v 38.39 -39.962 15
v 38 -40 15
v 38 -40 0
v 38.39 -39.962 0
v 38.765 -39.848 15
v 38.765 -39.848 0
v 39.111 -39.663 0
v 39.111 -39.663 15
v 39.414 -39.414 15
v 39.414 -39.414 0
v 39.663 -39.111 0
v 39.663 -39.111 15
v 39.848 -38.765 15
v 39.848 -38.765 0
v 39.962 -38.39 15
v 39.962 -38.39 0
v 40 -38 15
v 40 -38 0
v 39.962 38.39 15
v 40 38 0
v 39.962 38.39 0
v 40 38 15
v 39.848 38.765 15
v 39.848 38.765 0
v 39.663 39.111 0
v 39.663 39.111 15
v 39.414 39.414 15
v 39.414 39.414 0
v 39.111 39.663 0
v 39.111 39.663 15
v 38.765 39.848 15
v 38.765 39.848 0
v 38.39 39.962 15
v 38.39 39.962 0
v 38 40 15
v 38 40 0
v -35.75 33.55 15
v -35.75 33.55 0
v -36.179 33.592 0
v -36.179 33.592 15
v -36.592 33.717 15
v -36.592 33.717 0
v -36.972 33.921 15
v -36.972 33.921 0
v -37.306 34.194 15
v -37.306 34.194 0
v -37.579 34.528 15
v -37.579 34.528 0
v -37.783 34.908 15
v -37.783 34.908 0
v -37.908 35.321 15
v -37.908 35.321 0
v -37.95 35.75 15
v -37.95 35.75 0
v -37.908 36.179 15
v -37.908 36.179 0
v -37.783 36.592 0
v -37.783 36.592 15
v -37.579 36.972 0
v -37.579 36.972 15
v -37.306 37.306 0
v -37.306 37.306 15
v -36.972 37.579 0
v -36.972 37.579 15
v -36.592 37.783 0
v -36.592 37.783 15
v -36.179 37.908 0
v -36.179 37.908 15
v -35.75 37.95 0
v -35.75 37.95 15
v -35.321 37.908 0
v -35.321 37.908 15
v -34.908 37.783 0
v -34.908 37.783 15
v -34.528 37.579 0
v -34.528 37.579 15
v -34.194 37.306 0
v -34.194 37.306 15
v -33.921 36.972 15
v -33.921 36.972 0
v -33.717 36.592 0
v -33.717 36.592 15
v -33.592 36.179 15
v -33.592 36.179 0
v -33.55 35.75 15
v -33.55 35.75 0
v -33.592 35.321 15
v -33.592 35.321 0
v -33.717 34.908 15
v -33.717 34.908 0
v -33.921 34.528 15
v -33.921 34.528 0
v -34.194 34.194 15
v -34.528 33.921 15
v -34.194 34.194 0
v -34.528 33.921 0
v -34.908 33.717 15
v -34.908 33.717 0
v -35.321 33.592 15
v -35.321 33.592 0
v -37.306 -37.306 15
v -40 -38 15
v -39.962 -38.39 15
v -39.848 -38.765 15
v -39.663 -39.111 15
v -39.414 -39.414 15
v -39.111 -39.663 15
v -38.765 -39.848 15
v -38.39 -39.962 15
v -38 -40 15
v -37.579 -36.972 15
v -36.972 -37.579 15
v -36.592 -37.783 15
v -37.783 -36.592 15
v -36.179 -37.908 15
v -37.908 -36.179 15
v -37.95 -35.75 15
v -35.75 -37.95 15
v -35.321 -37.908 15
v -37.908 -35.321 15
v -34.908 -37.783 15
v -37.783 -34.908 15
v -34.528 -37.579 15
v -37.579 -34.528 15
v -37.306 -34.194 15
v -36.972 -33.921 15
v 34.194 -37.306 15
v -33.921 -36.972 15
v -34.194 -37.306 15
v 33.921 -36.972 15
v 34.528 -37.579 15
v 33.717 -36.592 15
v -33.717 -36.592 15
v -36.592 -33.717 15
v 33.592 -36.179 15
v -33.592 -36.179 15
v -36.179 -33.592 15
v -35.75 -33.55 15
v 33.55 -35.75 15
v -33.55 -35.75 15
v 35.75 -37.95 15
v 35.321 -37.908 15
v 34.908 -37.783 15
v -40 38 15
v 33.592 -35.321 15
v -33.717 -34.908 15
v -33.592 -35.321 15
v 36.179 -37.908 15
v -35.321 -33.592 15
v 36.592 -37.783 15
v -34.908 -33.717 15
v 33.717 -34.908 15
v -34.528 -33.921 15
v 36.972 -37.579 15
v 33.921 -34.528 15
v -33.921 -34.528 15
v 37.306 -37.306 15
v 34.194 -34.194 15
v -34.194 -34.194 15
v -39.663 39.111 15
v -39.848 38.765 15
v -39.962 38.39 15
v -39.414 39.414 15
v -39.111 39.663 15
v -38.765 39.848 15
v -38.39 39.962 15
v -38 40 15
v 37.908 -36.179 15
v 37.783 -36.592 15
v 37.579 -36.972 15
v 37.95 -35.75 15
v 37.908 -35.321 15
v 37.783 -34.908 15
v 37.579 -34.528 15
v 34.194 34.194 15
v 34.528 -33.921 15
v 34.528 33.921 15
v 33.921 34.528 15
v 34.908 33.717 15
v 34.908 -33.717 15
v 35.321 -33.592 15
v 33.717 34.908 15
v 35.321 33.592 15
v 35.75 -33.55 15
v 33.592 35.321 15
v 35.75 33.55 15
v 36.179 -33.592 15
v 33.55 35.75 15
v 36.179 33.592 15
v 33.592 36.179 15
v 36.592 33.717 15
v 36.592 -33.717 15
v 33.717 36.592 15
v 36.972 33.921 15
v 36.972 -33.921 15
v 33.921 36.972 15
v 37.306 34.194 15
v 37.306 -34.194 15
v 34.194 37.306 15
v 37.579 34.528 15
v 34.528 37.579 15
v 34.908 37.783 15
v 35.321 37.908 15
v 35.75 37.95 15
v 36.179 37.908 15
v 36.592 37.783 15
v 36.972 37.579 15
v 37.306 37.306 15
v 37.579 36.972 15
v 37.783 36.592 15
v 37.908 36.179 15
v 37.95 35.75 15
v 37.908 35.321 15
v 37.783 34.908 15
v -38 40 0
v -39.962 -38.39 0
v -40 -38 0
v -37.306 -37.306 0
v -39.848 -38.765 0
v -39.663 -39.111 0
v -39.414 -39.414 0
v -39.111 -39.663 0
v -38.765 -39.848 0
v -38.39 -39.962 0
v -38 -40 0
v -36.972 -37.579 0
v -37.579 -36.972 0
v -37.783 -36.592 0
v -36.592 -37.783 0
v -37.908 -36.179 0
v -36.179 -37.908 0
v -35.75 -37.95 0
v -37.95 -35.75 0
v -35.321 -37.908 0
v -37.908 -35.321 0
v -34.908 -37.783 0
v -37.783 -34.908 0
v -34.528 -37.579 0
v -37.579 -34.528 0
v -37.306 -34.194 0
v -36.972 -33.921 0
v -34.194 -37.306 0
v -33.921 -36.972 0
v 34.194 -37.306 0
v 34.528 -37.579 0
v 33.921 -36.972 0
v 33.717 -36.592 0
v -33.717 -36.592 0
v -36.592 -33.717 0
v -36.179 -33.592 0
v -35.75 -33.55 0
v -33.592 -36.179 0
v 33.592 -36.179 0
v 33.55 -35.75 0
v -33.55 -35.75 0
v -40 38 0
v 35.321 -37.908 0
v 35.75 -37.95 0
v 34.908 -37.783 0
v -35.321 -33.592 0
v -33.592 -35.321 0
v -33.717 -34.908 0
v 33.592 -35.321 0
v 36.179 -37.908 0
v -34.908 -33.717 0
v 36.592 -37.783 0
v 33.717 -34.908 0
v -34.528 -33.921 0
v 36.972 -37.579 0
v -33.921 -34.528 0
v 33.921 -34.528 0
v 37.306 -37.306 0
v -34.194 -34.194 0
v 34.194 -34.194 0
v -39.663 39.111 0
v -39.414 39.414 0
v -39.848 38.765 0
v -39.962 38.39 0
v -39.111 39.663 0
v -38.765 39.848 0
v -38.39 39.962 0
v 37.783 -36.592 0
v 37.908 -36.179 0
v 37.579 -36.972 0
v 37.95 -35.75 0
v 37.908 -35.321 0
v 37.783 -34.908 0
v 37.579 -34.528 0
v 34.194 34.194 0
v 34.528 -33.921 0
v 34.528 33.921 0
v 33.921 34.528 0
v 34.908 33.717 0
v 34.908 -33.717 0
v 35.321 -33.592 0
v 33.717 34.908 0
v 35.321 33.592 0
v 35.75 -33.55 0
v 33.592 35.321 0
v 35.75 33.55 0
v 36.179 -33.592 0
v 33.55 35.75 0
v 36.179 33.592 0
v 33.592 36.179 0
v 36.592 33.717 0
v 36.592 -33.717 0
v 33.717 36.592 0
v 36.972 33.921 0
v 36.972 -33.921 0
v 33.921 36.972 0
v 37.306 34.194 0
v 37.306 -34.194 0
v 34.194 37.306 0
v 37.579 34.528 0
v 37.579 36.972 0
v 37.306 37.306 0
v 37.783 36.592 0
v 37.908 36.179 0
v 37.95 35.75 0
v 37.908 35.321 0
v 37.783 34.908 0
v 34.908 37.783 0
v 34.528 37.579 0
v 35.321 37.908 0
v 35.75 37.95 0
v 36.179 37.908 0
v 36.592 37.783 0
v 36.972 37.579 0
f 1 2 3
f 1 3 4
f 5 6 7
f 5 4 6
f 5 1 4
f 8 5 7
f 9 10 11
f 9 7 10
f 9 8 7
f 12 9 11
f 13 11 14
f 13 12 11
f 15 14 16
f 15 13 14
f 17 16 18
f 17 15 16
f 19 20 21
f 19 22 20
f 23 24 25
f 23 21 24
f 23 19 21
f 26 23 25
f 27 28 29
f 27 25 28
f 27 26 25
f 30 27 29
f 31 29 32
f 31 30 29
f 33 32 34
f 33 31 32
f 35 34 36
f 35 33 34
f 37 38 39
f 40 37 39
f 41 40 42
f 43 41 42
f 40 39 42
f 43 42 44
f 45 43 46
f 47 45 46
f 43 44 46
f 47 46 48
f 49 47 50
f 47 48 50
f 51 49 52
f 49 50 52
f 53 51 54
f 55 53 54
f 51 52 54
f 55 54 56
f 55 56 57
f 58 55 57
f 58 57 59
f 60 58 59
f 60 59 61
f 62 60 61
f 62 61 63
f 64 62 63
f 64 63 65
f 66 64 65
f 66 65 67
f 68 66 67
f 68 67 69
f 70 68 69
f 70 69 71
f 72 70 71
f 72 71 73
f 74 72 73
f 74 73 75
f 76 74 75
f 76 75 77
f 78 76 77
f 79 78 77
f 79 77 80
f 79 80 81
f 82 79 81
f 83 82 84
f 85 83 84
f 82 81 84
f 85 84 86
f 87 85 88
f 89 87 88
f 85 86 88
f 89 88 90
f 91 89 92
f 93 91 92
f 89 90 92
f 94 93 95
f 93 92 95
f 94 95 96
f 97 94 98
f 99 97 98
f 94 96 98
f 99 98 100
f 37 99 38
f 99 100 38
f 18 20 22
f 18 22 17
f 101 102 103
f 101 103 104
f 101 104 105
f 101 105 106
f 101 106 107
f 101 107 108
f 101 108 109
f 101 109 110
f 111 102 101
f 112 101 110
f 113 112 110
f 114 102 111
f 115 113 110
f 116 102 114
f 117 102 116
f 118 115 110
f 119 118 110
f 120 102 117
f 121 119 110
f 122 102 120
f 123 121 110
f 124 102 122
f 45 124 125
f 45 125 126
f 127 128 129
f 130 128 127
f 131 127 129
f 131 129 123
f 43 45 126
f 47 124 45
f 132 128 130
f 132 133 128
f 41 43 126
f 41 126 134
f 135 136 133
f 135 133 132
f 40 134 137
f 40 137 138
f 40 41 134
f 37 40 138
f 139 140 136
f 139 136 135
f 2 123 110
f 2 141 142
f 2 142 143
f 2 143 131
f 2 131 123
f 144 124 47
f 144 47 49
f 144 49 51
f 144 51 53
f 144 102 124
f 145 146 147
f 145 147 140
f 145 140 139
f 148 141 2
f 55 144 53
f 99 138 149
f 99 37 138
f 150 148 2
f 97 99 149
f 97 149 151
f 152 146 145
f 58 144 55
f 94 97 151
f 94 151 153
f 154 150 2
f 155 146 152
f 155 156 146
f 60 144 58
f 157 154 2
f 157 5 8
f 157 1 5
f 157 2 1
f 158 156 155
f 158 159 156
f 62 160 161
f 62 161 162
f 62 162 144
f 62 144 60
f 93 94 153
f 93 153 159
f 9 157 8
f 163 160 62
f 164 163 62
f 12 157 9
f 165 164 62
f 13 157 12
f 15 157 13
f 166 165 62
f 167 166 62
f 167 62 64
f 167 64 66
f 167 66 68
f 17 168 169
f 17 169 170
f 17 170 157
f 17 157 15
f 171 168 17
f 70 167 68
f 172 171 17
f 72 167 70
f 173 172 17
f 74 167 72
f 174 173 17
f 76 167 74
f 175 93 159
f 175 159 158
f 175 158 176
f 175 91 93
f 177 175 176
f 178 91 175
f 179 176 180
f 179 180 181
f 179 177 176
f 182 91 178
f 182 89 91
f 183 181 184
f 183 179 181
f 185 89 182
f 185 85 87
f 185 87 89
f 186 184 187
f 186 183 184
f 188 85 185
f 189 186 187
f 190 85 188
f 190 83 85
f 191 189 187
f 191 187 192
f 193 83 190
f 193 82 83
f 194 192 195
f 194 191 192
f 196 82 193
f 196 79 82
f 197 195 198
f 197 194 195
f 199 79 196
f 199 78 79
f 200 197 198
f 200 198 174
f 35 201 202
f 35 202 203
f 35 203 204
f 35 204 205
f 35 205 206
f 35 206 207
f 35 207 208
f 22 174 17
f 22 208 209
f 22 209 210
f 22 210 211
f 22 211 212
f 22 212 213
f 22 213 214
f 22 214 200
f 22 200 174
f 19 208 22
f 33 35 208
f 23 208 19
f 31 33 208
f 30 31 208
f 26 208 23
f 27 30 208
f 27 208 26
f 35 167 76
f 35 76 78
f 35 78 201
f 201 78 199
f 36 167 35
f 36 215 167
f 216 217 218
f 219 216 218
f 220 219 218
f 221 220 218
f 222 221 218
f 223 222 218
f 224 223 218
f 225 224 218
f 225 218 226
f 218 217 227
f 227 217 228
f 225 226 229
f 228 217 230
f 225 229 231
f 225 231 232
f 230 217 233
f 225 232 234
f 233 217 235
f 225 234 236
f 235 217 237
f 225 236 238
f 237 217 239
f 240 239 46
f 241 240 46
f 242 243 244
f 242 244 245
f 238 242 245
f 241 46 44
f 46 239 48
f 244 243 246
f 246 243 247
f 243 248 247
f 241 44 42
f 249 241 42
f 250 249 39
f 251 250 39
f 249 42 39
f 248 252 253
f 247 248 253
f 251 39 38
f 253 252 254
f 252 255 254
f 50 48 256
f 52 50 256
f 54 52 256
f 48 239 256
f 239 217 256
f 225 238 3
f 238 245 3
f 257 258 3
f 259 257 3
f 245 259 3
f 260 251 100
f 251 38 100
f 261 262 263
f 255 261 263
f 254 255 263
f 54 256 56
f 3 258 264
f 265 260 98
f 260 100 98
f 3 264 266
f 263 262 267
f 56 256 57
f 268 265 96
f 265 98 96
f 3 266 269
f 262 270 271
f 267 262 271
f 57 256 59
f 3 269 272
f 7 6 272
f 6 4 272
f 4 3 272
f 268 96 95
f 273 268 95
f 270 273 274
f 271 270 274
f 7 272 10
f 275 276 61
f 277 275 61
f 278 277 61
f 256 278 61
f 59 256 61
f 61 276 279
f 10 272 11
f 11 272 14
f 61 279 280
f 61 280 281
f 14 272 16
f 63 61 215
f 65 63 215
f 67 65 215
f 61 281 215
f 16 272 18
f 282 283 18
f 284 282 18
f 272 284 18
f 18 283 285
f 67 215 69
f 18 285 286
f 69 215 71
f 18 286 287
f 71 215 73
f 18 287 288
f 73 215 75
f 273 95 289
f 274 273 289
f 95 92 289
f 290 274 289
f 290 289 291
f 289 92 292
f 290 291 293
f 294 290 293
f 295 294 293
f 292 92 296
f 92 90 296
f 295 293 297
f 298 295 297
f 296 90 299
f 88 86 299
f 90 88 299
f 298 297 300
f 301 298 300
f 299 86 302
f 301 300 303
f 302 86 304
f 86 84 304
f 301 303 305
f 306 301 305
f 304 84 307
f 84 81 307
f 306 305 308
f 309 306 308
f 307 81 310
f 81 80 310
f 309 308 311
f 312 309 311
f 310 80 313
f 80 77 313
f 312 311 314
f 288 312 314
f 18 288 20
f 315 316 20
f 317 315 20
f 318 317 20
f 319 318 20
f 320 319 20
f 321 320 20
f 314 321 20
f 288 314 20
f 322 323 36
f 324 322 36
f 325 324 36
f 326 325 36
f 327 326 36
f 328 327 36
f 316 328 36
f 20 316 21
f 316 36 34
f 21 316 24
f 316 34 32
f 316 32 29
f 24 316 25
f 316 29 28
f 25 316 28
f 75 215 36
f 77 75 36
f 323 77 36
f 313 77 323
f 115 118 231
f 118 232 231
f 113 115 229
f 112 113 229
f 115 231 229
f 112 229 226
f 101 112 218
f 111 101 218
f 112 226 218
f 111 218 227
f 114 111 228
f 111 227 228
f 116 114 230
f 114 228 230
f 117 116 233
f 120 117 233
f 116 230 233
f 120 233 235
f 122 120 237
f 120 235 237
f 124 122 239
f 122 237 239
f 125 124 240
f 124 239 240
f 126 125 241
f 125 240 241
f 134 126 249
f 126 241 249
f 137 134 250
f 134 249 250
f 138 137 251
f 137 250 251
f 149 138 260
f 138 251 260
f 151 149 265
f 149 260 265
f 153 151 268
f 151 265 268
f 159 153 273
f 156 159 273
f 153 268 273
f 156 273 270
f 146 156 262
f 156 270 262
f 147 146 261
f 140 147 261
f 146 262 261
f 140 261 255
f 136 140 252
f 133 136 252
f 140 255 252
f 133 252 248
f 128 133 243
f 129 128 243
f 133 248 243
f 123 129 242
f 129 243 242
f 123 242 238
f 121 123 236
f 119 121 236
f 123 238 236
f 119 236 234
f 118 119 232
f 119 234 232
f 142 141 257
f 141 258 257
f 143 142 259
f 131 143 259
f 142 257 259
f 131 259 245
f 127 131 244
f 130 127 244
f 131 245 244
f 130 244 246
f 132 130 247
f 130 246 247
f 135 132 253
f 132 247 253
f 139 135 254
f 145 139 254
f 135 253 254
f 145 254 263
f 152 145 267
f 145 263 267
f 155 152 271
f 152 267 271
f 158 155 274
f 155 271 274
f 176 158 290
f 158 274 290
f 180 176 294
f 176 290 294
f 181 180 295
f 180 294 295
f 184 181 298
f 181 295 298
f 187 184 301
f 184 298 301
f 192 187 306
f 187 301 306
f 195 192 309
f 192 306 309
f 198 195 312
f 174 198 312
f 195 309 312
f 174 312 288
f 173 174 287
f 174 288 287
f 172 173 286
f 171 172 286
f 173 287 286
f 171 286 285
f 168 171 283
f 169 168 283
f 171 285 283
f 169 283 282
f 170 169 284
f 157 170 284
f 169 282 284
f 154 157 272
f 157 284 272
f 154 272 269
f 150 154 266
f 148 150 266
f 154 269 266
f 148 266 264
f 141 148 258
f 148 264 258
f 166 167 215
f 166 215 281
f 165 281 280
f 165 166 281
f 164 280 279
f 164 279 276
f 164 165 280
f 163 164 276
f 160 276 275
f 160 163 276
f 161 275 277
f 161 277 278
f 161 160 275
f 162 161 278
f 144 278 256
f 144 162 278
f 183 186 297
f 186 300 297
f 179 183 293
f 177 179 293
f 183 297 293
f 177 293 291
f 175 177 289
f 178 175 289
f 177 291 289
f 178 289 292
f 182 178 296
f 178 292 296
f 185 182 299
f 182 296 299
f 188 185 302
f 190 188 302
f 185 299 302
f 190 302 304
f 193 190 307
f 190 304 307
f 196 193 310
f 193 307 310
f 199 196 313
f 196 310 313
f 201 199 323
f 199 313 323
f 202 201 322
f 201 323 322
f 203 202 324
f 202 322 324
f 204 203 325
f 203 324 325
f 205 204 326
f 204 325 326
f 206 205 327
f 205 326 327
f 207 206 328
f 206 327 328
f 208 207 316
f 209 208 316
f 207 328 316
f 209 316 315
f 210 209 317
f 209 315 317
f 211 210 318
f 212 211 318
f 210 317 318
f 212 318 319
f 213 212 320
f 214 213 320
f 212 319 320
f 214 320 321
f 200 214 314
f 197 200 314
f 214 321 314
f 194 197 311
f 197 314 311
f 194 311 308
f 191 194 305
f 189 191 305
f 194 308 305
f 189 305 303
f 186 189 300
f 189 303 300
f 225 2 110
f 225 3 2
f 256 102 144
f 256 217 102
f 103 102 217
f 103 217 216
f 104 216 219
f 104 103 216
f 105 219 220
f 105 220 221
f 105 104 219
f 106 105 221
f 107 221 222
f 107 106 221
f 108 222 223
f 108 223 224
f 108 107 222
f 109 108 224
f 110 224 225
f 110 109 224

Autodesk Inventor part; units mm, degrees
ref_plane "YZ Plane" through (0, 0, 0) normal (1, 0, 0) x (0, 1, 0)
ref_plane "XZ Plane" through (0, 0, 0) normal (0, 1, 0) x (-1, 0, 0)
ref_plane "XY Plane" through (0, 0, 0) normal (0, 0, 1) x (1, 0, 0)
sketch "Sketch1" plane through (0, 0, 0) normal (0, 0, 1) x (1, 0, 0)
  line L0 (-40, 40) -> (40, 40)
  line L1 (40, 40) -> (40, -40)
  line L2 (40, -40) -> (-40, -40)
  line L3 (-40, -40) -> (-40, 40)
  point P0 (0, 0)
  point P1 (0, 40)
  point P2 (-40, 0)
  dimension "d0" = 80
extrude "Extrusion1" add sketch "Sketch1" along normal blind 15
sketch "Sketch2" plane through (0, 0, 15) normal (0, 0, 1) x (1, 0, 0)
  line L0 (-35.75, 35.75) -> (35.75, 35.75)
  line L1 (35.75, 35.75) -> (35.75, -35.75)
  line L2 (35.75, -35.75) -> (-35.75, -35.75)
  line L3 (-35.75, -35.75) -> (-35.75, 35.75)
  point P0 (0, 0)
  point P1 (0, 35.75)
  point P2 (-35.75, 0)
  dimension "d3" = 71.5
hole "Hole1" at (-35.75, 35.75, 15) at (35.75, 35.75, 15) at (-35.75, -35.75, 15) at (35.75, -35.75, 15) direction (0, 0, -1) diameter 4.4 end through all
fillet "Fillet1" radius 2 4 edges at (-40, 40, 7.5) (40, 40, 7.5) (40, -40, 7.5) (-40, -40, 7.5)
properties part number "FAN SPACE MODEL"
